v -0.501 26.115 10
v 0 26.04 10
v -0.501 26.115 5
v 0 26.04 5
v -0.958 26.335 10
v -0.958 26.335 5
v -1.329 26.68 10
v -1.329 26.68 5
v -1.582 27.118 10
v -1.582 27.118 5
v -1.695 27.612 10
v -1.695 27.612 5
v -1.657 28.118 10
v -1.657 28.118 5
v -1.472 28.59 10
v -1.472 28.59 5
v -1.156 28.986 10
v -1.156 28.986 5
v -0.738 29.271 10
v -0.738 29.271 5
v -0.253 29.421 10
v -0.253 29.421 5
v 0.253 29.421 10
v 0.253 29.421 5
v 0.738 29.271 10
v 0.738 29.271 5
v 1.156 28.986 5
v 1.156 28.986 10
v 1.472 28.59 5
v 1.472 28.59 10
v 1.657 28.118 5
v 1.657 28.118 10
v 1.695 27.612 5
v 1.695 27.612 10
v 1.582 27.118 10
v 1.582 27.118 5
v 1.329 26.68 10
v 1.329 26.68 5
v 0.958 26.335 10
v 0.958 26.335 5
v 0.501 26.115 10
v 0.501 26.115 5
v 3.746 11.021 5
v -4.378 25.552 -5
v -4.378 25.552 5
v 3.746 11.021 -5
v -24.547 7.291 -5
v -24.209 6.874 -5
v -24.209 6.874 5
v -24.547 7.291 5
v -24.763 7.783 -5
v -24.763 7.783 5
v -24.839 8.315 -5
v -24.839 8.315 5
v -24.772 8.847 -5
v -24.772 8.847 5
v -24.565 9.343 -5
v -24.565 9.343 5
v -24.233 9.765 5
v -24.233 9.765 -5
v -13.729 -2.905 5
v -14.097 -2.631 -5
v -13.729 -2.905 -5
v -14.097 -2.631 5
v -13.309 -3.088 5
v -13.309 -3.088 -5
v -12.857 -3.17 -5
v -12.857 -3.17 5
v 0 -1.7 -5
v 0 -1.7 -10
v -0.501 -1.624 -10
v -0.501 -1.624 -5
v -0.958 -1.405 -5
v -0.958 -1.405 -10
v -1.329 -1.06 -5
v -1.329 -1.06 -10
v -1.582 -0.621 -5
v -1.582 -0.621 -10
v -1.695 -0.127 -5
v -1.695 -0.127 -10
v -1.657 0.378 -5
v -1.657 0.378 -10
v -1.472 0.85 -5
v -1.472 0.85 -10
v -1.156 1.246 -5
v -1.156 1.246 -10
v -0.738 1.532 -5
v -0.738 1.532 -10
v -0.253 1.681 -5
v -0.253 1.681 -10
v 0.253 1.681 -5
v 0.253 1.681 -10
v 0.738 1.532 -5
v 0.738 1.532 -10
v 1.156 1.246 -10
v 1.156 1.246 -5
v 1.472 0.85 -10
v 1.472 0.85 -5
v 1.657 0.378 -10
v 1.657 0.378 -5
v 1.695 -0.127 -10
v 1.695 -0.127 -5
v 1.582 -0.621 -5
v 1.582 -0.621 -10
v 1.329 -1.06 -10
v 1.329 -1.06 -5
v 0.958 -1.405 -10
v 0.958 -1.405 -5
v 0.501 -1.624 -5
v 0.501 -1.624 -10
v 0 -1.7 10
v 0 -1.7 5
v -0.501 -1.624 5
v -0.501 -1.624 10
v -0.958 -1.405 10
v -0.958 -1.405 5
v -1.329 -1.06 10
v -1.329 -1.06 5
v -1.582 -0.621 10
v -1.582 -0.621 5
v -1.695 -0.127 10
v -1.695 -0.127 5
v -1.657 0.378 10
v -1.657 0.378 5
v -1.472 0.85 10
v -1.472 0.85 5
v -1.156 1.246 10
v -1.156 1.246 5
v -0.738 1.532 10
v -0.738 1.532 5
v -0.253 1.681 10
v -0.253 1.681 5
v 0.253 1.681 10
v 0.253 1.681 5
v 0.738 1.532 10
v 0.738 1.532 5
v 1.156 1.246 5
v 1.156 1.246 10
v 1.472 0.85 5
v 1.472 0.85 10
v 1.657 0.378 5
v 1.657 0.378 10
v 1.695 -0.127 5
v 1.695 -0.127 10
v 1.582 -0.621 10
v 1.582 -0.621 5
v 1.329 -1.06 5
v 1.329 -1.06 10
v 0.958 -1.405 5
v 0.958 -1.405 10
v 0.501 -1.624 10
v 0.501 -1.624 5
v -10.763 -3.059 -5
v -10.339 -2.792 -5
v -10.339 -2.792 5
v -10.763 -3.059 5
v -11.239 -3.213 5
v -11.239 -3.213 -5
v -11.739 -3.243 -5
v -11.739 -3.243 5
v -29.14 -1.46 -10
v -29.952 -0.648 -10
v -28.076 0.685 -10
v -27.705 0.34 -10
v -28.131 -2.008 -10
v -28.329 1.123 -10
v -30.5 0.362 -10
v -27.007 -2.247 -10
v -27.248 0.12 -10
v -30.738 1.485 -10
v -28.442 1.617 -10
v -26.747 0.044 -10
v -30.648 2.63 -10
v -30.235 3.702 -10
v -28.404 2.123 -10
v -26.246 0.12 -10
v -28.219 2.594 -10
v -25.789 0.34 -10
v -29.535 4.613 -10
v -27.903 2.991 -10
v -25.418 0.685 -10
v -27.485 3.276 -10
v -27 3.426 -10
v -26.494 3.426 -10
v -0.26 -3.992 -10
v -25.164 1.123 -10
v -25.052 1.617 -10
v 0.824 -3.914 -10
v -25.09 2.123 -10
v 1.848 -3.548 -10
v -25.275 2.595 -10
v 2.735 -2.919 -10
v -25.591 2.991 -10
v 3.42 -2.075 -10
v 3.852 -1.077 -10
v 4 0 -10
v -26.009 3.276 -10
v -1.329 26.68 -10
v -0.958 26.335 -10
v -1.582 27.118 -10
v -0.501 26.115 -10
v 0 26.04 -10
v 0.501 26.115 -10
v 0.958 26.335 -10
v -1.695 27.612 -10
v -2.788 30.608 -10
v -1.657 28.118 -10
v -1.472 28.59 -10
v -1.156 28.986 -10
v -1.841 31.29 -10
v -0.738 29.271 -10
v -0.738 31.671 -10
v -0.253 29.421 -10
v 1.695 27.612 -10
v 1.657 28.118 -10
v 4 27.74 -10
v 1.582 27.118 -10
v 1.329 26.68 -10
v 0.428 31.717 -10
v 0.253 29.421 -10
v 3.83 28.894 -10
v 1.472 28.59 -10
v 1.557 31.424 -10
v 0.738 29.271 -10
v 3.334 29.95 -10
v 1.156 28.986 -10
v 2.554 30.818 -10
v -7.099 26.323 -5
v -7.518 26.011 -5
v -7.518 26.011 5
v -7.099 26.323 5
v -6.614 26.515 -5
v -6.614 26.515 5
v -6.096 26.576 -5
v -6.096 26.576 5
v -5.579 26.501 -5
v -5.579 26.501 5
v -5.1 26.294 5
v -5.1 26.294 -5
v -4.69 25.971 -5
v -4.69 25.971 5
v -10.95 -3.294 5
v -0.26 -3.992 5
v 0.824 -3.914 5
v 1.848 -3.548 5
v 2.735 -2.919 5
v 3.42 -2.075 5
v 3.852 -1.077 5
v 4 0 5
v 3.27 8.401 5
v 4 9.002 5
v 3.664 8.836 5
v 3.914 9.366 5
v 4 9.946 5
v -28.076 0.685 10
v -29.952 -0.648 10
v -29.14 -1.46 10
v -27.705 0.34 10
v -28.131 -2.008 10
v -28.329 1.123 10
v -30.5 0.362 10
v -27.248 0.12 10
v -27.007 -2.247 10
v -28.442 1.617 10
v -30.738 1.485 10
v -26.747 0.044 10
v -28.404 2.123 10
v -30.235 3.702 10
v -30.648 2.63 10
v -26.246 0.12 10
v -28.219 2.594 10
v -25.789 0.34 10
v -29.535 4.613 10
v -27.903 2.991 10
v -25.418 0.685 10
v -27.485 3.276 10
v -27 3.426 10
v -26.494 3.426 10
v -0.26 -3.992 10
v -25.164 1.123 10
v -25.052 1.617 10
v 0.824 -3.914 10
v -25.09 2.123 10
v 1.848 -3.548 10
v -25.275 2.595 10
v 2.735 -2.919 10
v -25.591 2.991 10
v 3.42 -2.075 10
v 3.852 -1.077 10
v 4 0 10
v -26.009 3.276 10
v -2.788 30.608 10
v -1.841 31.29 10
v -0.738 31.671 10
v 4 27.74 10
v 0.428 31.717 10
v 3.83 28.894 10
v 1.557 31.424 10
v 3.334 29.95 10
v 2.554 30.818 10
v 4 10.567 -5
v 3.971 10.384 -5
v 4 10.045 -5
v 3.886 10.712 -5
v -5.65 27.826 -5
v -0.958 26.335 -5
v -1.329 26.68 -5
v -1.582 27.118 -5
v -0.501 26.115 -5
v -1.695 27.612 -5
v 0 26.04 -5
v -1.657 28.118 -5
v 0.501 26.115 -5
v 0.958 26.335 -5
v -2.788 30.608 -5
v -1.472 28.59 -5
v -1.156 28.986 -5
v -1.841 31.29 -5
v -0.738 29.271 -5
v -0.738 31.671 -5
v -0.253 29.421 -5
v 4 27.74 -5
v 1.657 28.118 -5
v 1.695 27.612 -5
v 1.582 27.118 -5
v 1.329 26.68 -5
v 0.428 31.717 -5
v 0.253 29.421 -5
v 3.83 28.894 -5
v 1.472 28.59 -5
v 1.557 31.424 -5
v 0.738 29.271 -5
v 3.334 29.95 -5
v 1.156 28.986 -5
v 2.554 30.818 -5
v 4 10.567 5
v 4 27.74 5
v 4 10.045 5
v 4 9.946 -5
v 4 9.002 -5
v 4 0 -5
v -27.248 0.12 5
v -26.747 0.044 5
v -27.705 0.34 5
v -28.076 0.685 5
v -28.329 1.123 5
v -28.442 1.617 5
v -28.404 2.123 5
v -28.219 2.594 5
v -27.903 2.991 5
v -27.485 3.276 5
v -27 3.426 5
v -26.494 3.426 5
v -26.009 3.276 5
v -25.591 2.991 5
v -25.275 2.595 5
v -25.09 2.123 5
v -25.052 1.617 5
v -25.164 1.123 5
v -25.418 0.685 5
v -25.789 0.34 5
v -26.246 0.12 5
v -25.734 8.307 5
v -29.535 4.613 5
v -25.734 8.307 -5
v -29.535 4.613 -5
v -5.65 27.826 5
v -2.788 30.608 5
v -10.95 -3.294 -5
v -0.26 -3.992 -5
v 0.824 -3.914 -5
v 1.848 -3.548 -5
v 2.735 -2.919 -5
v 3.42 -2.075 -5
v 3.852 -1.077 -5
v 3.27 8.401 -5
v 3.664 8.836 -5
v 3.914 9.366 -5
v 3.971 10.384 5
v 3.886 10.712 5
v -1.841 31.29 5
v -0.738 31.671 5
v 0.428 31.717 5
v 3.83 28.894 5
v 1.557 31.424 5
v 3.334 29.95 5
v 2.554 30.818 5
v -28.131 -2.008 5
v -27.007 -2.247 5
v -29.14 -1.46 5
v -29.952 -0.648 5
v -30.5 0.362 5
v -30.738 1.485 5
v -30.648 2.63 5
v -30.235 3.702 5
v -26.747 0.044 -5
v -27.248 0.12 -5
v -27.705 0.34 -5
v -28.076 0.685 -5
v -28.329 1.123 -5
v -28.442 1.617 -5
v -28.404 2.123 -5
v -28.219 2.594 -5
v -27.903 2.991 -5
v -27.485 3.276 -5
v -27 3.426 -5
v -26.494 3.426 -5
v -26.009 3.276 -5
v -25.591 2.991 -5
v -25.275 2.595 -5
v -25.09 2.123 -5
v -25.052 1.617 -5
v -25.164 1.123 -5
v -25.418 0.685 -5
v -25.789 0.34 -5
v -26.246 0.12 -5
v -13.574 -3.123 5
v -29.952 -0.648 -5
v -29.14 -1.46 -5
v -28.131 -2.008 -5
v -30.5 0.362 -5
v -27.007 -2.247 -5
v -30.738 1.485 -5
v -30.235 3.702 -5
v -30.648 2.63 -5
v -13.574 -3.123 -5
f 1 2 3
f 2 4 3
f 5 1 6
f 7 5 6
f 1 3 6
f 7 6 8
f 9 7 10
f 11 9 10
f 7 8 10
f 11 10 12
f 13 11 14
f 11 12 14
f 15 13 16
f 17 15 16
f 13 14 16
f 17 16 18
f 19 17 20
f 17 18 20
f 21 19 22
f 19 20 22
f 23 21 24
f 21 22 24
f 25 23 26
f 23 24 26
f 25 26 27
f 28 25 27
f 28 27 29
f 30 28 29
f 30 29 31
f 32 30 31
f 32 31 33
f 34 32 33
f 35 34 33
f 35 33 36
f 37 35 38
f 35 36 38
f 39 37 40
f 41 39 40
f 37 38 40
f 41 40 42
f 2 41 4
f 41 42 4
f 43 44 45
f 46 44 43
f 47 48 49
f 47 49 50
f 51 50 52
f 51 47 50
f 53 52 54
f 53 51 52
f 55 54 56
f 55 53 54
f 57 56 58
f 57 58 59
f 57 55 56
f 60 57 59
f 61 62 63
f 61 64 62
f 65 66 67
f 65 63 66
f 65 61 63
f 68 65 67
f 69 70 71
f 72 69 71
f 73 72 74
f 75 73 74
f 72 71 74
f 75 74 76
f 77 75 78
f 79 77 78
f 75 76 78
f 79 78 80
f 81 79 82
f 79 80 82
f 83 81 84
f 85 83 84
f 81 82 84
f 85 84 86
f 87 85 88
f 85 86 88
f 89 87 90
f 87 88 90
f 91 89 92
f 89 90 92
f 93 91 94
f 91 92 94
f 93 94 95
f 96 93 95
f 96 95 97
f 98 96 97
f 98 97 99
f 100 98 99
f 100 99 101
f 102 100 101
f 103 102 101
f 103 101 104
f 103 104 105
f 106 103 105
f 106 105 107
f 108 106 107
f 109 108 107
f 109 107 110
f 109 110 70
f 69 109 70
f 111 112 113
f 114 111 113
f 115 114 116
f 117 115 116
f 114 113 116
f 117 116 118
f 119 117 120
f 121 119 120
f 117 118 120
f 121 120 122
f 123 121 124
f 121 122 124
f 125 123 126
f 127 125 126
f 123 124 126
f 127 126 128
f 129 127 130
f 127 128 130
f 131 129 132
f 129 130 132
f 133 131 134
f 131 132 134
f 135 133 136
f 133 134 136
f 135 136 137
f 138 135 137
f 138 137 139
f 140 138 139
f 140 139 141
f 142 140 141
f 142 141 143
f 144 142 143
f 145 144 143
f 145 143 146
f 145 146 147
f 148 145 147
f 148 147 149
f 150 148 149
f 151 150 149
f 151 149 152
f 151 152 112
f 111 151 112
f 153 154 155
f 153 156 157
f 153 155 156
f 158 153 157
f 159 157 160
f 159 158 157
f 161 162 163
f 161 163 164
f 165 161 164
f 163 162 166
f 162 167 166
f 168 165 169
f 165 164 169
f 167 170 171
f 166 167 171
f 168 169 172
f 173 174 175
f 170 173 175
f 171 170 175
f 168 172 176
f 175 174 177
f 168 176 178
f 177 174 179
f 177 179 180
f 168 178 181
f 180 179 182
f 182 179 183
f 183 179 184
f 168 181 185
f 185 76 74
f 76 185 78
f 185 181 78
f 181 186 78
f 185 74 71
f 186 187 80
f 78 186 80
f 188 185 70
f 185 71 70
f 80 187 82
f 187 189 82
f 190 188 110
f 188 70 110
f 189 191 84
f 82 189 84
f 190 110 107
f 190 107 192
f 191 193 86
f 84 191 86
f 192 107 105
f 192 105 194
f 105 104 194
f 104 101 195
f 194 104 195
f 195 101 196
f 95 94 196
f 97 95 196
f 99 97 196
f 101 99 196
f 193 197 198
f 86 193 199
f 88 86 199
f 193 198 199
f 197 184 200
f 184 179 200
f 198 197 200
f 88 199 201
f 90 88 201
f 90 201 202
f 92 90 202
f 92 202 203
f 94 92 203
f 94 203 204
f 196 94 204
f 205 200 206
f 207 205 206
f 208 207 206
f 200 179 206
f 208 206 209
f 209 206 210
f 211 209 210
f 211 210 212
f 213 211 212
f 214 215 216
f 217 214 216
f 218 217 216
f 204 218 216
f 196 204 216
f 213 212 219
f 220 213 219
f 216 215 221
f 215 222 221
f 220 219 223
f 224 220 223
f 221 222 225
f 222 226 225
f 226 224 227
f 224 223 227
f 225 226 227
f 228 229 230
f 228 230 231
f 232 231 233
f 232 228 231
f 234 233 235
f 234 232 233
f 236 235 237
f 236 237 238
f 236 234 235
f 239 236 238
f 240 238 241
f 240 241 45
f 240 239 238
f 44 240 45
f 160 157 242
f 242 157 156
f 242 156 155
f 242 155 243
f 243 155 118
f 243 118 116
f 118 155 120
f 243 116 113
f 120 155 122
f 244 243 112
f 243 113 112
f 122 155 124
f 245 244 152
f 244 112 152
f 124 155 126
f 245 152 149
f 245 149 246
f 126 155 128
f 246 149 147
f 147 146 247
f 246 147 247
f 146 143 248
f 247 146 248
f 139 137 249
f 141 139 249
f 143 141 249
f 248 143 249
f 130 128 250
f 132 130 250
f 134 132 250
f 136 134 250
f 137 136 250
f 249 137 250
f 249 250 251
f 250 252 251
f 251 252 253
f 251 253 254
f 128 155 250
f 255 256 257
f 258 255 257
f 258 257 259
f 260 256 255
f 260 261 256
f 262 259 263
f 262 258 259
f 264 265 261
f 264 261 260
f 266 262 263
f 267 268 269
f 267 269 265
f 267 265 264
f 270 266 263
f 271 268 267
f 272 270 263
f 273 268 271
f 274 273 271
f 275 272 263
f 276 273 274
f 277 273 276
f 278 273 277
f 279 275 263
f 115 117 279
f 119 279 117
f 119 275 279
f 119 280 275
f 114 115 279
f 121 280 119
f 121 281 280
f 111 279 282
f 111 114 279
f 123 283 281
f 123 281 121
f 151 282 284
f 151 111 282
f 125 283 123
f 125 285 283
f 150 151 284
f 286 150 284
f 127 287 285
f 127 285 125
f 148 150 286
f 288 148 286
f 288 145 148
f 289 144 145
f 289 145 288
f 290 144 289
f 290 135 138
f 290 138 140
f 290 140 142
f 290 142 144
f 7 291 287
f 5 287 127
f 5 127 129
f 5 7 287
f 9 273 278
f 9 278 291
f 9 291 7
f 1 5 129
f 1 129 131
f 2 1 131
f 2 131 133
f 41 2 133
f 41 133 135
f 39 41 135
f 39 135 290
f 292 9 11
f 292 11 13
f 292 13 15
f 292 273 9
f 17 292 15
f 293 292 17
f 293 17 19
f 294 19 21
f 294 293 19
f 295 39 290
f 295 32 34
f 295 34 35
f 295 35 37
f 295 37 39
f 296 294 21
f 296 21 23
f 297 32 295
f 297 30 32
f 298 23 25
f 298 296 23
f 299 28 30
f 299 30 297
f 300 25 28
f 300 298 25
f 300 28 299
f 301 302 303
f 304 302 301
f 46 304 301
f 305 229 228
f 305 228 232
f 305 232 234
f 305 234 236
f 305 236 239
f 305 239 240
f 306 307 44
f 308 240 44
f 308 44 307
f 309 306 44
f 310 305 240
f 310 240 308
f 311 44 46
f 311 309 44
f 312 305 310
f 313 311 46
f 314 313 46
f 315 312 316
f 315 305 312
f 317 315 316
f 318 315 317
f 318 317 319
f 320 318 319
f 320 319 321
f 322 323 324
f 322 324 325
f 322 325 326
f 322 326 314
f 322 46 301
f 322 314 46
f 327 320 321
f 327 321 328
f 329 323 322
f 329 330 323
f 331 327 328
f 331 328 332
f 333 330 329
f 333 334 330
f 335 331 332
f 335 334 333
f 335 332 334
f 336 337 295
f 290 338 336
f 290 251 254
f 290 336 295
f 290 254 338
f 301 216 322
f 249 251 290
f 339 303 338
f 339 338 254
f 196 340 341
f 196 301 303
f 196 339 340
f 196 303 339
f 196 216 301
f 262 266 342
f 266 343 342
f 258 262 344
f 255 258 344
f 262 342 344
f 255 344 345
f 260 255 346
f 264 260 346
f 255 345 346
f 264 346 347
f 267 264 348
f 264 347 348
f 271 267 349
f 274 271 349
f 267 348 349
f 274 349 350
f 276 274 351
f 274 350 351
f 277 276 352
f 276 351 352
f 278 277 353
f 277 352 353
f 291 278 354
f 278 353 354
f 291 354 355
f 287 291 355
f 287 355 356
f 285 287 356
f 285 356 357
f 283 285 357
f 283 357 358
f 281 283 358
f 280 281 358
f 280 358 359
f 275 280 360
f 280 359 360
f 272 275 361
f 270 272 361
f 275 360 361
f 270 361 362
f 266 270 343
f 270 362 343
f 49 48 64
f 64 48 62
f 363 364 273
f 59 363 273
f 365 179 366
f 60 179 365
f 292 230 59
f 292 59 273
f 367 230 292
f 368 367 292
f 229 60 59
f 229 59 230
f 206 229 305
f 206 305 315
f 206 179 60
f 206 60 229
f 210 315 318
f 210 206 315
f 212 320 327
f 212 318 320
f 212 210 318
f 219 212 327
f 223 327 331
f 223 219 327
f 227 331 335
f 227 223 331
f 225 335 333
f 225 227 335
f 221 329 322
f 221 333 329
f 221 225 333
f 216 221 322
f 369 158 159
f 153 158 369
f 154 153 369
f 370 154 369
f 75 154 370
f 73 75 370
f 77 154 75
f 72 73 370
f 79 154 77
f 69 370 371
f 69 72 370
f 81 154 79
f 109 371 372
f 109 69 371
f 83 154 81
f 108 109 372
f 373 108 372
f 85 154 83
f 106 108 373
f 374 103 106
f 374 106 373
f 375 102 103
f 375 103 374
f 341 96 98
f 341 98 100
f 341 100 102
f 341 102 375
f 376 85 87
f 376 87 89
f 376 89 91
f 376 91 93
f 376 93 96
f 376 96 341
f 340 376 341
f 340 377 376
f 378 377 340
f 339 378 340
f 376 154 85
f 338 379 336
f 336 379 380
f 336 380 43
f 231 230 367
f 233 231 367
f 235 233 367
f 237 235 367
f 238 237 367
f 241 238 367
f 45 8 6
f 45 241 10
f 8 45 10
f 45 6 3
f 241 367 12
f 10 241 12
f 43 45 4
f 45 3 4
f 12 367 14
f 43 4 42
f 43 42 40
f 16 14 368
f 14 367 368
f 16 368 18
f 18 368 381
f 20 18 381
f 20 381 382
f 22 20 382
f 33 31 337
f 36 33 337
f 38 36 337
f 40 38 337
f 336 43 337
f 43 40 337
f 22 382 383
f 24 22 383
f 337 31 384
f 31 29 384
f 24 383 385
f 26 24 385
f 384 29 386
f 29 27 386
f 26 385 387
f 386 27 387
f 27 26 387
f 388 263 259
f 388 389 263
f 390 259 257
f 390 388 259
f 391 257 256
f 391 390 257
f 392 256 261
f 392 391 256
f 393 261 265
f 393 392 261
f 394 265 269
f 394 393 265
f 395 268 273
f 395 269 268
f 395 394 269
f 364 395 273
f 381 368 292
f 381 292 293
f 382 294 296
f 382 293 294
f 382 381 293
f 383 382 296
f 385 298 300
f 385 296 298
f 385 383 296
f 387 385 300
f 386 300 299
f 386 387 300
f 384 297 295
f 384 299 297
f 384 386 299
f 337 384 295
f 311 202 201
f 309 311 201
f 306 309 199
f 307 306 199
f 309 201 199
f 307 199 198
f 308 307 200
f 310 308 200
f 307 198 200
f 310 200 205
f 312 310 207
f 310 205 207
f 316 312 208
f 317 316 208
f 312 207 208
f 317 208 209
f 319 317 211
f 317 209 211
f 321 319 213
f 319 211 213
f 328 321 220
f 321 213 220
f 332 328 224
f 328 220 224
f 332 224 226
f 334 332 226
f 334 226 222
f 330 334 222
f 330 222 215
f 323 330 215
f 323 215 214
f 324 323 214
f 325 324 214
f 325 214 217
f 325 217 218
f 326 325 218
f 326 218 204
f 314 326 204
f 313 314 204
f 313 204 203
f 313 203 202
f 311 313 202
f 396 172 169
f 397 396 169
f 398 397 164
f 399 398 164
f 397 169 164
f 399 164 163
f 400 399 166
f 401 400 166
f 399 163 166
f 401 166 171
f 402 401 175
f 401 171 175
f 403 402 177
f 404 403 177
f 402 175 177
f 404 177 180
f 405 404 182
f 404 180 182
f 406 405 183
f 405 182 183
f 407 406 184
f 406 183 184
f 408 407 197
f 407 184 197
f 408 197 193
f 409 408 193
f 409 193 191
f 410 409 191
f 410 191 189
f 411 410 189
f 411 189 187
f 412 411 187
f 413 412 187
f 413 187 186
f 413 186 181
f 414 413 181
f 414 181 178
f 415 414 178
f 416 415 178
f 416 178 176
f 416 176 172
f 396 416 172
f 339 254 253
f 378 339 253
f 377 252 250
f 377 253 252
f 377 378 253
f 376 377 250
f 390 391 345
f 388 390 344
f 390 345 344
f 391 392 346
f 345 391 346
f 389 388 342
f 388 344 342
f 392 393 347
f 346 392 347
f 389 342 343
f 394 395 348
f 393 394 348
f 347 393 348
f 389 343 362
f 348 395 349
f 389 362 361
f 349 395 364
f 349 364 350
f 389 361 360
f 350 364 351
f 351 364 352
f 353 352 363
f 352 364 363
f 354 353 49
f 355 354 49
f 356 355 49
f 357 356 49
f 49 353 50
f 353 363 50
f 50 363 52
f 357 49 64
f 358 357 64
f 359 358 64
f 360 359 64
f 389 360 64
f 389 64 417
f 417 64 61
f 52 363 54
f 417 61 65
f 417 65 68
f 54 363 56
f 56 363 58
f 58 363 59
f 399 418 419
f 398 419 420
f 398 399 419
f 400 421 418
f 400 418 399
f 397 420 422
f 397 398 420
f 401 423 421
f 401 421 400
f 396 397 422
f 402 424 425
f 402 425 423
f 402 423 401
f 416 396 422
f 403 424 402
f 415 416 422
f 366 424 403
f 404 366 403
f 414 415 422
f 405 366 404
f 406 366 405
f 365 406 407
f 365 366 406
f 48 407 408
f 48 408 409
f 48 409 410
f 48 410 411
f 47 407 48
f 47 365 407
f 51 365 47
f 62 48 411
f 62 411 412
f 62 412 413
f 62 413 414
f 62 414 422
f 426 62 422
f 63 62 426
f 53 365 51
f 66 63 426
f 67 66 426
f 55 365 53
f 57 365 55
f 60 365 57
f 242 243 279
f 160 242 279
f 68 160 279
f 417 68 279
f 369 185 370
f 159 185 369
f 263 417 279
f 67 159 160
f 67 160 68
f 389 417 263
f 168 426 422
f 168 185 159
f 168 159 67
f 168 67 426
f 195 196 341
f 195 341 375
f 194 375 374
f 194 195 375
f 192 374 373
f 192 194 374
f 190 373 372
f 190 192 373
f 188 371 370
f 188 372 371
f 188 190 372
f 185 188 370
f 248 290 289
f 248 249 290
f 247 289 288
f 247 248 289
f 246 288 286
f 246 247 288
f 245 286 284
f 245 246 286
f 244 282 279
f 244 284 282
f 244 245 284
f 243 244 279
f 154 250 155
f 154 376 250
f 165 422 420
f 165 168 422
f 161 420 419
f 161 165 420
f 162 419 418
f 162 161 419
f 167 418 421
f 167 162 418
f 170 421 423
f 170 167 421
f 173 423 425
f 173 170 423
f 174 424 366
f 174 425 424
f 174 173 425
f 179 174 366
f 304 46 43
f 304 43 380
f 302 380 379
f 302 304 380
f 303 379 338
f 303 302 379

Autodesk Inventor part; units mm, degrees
ref_plane "YZ Plane" through (0, 0, 0) normal (1, 0, 0) x (0, 1, 0)
ref_plane "XZ Plane" through (0, 0, 0) normal (0, 1, 0) x (-1, 0, 0)
ref_plane "XY Plane" through (0, 0, 0) normal (0, 0, 1) x (1, 0, 0)
sketch "Sketch1" plane through (0, 0, 0) normal (0, 0, 1) x (1, 0, 0)
  line L0 (0, 0) -> (-26.7469, 1.7445) construction
  line L1 (-26.7469, 1.7445) -> (0, 27.7395) construction
  line L2 (0, 27.7395) -> (0, 0) construction
  line L3 (-0.2603, -3.9915) -> (-27.0072, -2.247)
  line L4 (-29.5347, 4.6129) -> (-2.7878, 30.6079)
  line L5 (4, 27.7395) -> (4, 0)
  arc A0 (4, 27.7395) -> (-2.7878, 30.6079) centre (0, 27.7395) ccw
  arc A1 (-29.5347, 4.6129) -> (-27.0072, -2.247) centre (-26.7469, 1.7445) ccw
  arc A2 (-0.2603, -3.9915) -> (4, 0) centre (0, 0) ccw
  dimension "d6" = 37.2979
  dimension "d14" = 27.7395
  dimension "d15" = 26.8037
  dimension "d18" = 4
extrude "Extrusion1" add sketch "Sketch1" along normal mid plane 20
sketch "Sketch2" plane through (0, 0, 0) normal (0, 0, 1) x (1, 0, 0)
  arc A0 (4, 27.7395) -> (-2.7878, 30.6079) centre (0, 27.7395) ccw
  line L0 (-29.5347, 4.6129) -> (-25.7337, 8.3071)
  arc A1 (-29.5347, 4.6129) -> (-27.0072, -2.247) centre (-26.7469, 1.7445) ccw
  line L1 (-0.2603, -3.9915) -> (-10.9499, -3.2943)
  arc A2 (-0.2603, -3.9915) -> (4, 0) centre (0, 0) ccw
  line L2 (4, 27.7395) -> (4, 10.5666)
  line L3 (-25.7337, 8.3071) -> (-13.5738, -3.1232)
  line L4 (-25.7337, 8.3071) -> (-5.6497, 27.8265) construction
  line L5 (-13.5738, -3.1232) -> (-27.0072, -2.247)
  line L6 (-5.6497, 27.8265) -> (4, 10.5666)
  line L7 (4, 9.0015) -> (-10.9499, -3.2943)
  line L8 (4, 10.5666) -> (4, 9.0015) construction
  line L9 (4, 9.0015) -> (4, 0)
  line L10 (-10.9499, -3.2943) -> (-13.5738, -3.1232) construction
  line L11 (-5.6497, 27.8265) -> (-2.7878, 30.6079)
  arc A3 (-0.2603, -3.9915) -> (4, 0) centre (0, 0) ccw projected
  point P0 (0, 0)
extrude "Extrusion2" cut sketch "Sketch2" along normal mid plane 10
sketch "Sketch3" plane through (0, 0, 10) normal (0, 0, 1) x (1, 0, 0)
  arc A0 (4, 27.7395) -> (-2.7878, 30.6079) centre (0, 27.7395) ccw construction
  arc A1 (-29.5347, 4.6129) -> (-27.0072, -2.247) centre (-26.7469, 1.7445) ccw construction
  arc A2 (-0.2603, -3.9915) -> (4, 0) centre (0, 0) ccw construction
hole "Hole1" at (-26.7469, 1.7445, 10) at (0, 0, 10) at (0, 27.7395, 10) direction (0, 0, -1) diameter 3.4 end through all clearance for "Socket Head Cap Screw" size "M3" standard "Ansi Metric M Profile"
fillet "Fillet1" radius 2 6 edges at (-13.5738, -3.1232, 0) (-10.9499, -3.2943, 0) (-25.7337, 8.3071, 0) (-5.6497, 27.8265, 0) (4, 10.5666, 0) (4, 9.0015, 0)
equation "\"d6\" = LengthE"
equation "\"d14\" = LengthB"
equation "\"d15\" = LengthD"
equation "\"ScaleFactor\" = 1"
equation "\"LengthA\" = 25.4 * ScaleFactor"
equation "\"LengthB\" = 27.7395 * ScaleFactor"
equation "\"LengthC\" = 26.269 * ScaleFactor"
equation "\"LengthD\" = 26.8037 * ScaleFactor"
equation "\"LengthE\" = 37.2979 * ScaleFactor"
equation "\"LengthF\" = 26.3358 * ScaleFactor"
equation "\"LengthG\" = 24.531 * ScaleFactor"
equation "\"LengthH\" = 43.9153 * ScaleFactor"
equation "\"LengthI\" = 32.7525 * ScaleFactor"
equation "\"LengthJ\" = 33.421 * ScaleFactor"
equation "\"LengthK\" = 38.1 * ScaleFactor"
equation "\"LengthL\" = 5.21368 * ScaleFactor"
equation "\"LengthM\" = 10.0263 * ScaleFactor"
equation "\"d0\" = LengthA"
equation "\"d1\" = LengthJ"
equation "\"d2\" = LengthM"
equation "\"d3\" = LengthL"
equation "\"d4\" = LengthB"
equation "\"d5\" = LengthC"
equation "\"d7\" = LengthD"
equation "\"d8\" = LengthE"
equation "\"d9\" = LengthF"
equation "\"d10\" = LengthG"
equation "\"d11\" = LengthH"
equation "\"d12\" = LengthI"
equation "\"d13\" = LengthK"
